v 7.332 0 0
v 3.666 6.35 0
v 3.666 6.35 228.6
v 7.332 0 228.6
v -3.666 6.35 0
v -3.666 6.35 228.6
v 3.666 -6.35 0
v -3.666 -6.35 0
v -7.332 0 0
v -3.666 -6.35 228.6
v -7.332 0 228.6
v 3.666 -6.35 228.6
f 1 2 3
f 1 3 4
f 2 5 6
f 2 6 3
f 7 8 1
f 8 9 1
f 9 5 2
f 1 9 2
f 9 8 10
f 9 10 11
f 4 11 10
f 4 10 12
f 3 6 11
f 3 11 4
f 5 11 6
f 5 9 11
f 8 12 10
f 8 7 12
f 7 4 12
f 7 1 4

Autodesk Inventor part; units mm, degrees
ref_plane "YZ Plane" through (0, 0, 0) normal (1, 0, 0) x (0, 1, 0)
ref_plane "XZ Plane" through (0, 0, 0) normal (0, 1, 0) x (-1, 0, 0)
ref_plane "XY Plane" through (0, 0, 0) normal (0, 0, 1) x (1, 0, 0)
sketch "Sketch1" plane through (0, 0, 0) normal (0, 0, 1) x (1, 0, 0)
  line L0 (3.6662, 6.35) -> (7.3323, 0)
  line L1 (7.3323, 0) -> (3.6662, -6.35)
  line L2 (3.6662, -6.35) -> (-3.6662, -6.35)
  line L3 (-3.6662, -6.35) -> (-7.3323, 0)
  line L4 (-7.3323, 0) -> (-3.6662, 6.35)
  line L5 (-3.6662, 6.35) -> (3.6662, 6.35)
  point P0 (0, 0)
  point P1 (0, 0)
  dimension "d0" = 12.7
extrude "Extrusion1" add sketch "Sketch1" along normal blind 228.6
ref_plane "Work Plane1" through (-3.6662, -6.35, 0) normal (-0.866, 0.5, 0) x (0, 0, 1)
ref_plane "Work Plane2" through (-7.3323, 0, 0) normal (0, 1, 0) x (0, 0, 1)
properties part number "Steel Shaft" material "Steel"
